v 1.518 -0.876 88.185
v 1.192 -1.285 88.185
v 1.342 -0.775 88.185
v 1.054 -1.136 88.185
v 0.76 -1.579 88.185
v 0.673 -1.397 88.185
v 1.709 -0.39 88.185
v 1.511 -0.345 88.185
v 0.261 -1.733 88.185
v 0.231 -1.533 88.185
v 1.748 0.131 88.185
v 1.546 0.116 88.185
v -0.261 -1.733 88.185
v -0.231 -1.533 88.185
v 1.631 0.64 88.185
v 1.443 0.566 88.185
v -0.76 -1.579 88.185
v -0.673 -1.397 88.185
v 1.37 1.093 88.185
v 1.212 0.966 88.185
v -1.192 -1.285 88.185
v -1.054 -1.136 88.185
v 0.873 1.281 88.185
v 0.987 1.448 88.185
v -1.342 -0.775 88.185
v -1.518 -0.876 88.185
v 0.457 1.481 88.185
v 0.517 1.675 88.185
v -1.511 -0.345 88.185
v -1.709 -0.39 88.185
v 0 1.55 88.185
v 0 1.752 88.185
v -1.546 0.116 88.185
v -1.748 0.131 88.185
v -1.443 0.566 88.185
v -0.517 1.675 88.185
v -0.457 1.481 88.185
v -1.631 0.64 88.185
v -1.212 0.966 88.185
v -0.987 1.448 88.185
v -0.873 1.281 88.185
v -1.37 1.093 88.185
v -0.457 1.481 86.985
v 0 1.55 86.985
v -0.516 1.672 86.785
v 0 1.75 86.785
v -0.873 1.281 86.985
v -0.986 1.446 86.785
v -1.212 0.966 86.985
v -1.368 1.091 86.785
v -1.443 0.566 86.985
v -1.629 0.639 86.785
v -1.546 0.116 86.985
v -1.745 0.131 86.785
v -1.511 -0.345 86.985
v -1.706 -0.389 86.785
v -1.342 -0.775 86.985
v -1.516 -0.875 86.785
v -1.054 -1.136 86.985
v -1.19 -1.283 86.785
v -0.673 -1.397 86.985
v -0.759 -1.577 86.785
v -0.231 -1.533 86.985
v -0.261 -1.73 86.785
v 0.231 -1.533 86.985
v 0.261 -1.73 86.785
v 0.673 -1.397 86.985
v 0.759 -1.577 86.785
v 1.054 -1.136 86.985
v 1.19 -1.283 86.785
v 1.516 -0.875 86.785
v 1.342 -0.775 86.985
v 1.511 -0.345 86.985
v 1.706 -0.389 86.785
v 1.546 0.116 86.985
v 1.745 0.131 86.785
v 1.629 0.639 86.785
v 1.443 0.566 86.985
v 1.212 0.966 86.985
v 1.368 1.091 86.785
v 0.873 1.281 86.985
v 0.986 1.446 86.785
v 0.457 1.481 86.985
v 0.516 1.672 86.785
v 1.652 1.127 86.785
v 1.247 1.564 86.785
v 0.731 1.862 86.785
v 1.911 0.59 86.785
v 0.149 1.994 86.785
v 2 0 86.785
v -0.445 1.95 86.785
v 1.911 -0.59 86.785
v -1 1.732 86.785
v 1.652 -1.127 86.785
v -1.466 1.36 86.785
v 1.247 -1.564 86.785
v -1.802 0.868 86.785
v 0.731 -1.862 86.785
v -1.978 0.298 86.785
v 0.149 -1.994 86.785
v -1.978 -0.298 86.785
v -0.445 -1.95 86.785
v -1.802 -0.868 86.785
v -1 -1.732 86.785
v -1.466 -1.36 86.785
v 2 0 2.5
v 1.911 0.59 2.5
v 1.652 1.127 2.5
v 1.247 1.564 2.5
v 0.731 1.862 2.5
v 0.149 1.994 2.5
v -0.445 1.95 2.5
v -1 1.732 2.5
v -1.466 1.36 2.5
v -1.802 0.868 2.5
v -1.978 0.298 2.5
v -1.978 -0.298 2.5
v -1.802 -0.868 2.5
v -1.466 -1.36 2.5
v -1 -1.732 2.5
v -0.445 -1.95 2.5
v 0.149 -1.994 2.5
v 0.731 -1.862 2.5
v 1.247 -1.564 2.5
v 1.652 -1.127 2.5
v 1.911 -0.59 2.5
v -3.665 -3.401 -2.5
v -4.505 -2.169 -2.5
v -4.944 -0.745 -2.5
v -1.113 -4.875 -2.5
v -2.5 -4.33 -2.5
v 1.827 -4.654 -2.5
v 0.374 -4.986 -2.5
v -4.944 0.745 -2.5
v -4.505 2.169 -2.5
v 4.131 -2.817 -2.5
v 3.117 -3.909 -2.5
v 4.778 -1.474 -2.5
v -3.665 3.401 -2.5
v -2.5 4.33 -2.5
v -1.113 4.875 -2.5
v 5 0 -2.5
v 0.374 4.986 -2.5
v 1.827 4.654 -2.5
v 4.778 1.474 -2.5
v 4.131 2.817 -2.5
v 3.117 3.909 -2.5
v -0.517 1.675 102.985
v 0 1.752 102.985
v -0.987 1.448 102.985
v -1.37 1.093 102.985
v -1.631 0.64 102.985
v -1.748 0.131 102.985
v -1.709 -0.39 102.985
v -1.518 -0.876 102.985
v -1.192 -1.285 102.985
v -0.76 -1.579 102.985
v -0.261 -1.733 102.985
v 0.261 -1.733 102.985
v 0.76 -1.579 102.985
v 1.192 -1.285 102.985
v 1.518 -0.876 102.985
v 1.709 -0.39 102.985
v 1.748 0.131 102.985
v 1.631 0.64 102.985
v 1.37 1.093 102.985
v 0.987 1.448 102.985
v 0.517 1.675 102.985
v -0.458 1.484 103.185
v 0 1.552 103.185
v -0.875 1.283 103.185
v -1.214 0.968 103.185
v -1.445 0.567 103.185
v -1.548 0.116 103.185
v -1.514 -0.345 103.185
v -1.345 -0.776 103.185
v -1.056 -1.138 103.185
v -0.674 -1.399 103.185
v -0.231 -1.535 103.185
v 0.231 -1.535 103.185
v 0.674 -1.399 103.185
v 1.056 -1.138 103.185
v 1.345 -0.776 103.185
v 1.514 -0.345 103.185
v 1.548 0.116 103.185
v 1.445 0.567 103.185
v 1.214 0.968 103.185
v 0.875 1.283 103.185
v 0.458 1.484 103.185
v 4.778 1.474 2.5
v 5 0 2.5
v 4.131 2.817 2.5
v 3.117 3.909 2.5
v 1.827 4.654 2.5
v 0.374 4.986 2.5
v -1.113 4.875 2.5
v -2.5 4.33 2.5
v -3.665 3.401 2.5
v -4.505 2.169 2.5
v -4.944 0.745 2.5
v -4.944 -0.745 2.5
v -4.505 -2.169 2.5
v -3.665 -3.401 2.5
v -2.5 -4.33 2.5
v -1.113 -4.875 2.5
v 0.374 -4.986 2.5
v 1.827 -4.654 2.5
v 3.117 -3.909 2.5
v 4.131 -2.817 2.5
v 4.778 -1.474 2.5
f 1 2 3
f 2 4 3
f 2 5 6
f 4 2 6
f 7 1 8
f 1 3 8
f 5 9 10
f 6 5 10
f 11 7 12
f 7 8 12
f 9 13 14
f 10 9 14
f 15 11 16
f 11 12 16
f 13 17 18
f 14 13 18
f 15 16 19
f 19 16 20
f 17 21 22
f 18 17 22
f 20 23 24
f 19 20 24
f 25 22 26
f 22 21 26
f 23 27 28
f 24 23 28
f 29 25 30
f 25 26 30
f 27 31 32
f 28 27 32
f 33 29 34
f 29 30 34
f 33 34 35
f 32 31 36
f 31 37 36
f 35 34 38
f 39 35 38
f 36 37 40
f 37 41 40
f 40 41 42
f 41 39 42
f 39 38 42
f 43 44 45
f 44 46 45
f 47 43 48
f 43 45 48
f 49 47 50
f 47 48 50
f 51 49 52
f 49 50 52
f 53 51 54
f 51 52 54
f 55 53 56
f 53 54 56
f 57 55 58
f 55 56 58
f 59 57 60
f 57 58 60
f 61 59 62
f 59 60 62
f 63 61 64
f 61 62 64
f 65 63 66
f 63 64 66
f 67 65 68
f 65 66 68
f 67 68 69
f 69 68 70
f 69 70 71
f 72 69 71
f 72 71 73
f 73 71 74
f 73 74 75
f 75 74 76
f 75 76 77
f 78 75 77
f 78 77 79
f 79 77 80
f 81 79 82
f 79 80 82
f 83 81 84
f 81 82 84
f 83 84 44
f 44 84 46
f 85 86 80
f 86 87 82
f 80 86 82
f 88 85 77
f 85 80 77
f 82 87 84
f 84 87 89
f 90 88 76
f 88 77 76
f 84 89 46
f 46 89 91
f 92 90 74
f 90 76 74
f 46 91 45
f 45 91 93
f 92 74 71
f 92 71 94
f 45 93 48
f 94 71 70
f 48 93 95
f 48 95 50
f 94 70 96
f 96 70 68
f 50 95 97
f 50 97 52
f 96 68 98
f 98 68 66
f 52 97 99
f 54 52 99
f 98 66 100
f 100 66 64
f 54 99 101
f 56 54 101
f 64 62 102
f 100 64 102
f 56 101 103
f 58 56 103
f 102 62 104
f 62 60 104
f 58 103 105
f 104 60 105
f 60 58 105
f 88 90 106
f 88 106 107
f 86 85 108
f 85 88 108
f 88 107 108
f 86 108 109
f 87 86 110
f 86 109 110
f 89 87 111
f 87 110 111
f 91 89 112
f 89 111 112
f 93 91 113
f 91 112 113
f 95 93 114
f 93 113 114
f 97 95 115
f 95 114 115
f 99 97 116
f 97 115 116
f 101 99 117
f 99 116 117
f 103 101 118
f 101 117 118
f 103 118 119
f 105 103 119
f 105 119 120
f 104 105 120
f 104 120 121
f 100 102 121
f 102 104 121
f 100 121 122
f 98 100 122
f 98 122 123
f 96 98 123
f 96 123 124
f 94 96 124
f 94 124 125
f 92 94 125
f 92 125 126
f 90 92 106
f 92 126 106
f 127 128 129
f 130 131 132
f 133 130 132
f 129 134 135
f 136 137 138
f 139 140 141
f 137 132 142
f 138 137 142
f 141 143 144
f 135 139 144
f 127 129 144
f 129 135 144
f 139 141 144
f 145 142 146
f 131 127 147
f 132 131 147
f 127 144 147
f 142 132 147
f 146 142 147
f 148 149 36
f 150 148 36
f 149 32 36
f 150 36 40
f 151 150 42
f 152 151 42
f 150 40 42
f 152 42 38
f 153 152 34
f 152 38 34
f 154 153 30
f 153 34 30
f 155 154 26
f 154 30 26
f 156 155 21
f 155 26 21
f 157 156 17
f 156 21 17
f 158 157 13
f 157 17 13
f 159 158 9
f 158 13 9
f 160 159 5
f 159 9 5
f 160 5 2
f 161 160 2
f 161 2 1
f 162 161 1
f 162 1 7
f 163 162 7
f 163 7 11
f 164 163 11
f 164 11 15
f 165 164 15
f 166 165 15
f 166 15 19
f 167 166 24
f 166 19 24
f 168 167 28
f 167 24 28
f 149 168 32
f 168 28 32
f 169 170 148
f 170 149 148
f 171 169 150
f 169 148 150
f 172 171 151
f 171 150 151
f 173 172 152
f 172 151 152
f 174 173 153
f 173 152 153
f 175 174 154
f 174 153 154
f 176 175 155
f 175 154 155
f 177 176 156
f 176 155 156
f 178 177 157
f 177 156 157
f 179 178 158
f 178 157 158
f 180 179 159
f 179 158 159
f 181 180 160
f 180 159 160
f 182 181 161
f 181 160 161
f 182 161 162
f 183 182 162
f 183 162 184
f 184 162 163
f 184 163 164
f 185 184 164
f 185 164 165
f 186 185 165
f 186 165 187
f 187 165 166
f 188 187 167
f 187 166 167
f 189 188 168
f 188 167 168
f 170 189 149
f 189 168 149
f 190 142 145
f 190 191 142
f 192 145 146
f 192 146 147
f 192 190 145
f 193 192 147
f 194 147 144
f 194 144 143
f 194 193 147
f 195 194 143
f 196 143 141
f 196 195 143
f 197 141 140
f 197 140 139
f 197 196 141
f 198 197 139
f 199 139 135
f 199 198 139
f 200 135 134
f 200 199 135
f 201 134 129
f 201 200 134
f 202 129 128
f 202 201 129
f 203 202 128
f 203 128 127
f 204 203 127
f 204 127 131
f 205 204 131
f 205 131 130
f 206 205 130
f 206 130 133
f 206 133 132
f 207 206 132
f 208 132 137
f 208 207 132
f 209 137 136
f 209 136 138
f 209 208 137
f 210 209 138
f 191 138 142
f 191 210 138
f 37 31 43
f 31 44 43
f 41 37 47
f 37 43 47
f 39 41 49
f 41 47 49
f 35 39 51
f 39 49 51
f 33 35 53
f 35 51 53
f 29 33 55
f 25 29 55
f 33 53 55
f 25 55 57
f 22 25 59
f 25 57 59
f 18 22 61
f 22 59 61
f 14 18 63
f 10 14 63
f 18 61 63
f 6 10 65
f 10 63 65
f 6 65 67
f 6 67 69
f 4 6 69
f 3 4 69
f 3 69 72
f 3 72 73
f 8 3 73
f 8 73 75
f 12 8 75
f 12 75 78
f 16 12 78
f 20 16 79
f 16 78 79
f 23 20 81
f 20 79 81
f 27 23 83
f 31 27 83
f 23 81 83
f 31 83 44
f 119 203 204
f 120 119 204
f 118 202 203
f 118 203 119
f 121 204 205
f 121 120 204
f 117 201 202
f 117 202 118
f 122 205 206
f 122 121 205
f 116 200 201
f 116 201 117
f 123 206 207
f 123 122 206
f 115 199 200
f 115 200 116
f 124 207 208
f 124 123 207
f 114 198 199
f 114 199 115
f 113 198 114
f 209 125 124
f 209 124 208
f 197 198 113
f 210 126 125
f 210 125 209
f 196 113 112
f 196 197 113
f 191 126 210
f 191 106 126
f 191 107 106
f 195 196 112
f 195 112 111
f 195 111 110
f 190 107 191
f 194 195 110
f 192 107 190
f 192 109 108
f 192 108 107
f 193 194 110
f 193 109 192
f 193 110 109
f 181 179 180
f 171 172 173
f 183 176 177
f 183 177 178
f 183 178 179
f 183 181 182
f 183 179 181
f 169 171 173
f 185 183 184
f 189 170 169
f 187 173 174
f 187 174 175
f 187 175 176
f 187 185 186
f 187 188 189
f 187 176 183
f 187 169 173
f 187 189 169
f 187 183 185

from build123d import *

# Parameters (mm, degrees)
SKETCH1_R          = 2
BASE_EXTRUDE_DEPTH = 103.185
SKETCH2_R          = 5
PISTON_DEPTH       = 2.5


with BuildPart() as part:
    # Sketch1 → Base-Extrude (new body)
    with BuildSketch(Plane.XY):
        Circle(SKETCH1_R)
    extrude(amount=BASE_EXTRUDE_DEPTH)

    # Sketch2 → Piston (add, symmetric)
    with BuildSketch(Plane.XY):
        Circle(SKETCH2_R)
    extrude(amount=PISTON_DEPTH, both=True)

    # Sketch3 → Threads (revolve, cut)
    with BuildSketch(Plane(origin=(0, 0, 0), x_dir=(0, 0, -1), z_dir=(1, 0, 0))):
        Polygon((-103.185, 1.5525), (-102.985, 1.7525), (-88.185, 1.7525), (-88.185, 1.55), (-86.985, 1.55), (-86.785, 1.75), (-86.785, 5), (-103.185, 5), align=None)
    revolve(axis=Axis((0, 0, 0), (0, 0, 1)), mode=Mode.SUBTRACT)


solid = part.part
